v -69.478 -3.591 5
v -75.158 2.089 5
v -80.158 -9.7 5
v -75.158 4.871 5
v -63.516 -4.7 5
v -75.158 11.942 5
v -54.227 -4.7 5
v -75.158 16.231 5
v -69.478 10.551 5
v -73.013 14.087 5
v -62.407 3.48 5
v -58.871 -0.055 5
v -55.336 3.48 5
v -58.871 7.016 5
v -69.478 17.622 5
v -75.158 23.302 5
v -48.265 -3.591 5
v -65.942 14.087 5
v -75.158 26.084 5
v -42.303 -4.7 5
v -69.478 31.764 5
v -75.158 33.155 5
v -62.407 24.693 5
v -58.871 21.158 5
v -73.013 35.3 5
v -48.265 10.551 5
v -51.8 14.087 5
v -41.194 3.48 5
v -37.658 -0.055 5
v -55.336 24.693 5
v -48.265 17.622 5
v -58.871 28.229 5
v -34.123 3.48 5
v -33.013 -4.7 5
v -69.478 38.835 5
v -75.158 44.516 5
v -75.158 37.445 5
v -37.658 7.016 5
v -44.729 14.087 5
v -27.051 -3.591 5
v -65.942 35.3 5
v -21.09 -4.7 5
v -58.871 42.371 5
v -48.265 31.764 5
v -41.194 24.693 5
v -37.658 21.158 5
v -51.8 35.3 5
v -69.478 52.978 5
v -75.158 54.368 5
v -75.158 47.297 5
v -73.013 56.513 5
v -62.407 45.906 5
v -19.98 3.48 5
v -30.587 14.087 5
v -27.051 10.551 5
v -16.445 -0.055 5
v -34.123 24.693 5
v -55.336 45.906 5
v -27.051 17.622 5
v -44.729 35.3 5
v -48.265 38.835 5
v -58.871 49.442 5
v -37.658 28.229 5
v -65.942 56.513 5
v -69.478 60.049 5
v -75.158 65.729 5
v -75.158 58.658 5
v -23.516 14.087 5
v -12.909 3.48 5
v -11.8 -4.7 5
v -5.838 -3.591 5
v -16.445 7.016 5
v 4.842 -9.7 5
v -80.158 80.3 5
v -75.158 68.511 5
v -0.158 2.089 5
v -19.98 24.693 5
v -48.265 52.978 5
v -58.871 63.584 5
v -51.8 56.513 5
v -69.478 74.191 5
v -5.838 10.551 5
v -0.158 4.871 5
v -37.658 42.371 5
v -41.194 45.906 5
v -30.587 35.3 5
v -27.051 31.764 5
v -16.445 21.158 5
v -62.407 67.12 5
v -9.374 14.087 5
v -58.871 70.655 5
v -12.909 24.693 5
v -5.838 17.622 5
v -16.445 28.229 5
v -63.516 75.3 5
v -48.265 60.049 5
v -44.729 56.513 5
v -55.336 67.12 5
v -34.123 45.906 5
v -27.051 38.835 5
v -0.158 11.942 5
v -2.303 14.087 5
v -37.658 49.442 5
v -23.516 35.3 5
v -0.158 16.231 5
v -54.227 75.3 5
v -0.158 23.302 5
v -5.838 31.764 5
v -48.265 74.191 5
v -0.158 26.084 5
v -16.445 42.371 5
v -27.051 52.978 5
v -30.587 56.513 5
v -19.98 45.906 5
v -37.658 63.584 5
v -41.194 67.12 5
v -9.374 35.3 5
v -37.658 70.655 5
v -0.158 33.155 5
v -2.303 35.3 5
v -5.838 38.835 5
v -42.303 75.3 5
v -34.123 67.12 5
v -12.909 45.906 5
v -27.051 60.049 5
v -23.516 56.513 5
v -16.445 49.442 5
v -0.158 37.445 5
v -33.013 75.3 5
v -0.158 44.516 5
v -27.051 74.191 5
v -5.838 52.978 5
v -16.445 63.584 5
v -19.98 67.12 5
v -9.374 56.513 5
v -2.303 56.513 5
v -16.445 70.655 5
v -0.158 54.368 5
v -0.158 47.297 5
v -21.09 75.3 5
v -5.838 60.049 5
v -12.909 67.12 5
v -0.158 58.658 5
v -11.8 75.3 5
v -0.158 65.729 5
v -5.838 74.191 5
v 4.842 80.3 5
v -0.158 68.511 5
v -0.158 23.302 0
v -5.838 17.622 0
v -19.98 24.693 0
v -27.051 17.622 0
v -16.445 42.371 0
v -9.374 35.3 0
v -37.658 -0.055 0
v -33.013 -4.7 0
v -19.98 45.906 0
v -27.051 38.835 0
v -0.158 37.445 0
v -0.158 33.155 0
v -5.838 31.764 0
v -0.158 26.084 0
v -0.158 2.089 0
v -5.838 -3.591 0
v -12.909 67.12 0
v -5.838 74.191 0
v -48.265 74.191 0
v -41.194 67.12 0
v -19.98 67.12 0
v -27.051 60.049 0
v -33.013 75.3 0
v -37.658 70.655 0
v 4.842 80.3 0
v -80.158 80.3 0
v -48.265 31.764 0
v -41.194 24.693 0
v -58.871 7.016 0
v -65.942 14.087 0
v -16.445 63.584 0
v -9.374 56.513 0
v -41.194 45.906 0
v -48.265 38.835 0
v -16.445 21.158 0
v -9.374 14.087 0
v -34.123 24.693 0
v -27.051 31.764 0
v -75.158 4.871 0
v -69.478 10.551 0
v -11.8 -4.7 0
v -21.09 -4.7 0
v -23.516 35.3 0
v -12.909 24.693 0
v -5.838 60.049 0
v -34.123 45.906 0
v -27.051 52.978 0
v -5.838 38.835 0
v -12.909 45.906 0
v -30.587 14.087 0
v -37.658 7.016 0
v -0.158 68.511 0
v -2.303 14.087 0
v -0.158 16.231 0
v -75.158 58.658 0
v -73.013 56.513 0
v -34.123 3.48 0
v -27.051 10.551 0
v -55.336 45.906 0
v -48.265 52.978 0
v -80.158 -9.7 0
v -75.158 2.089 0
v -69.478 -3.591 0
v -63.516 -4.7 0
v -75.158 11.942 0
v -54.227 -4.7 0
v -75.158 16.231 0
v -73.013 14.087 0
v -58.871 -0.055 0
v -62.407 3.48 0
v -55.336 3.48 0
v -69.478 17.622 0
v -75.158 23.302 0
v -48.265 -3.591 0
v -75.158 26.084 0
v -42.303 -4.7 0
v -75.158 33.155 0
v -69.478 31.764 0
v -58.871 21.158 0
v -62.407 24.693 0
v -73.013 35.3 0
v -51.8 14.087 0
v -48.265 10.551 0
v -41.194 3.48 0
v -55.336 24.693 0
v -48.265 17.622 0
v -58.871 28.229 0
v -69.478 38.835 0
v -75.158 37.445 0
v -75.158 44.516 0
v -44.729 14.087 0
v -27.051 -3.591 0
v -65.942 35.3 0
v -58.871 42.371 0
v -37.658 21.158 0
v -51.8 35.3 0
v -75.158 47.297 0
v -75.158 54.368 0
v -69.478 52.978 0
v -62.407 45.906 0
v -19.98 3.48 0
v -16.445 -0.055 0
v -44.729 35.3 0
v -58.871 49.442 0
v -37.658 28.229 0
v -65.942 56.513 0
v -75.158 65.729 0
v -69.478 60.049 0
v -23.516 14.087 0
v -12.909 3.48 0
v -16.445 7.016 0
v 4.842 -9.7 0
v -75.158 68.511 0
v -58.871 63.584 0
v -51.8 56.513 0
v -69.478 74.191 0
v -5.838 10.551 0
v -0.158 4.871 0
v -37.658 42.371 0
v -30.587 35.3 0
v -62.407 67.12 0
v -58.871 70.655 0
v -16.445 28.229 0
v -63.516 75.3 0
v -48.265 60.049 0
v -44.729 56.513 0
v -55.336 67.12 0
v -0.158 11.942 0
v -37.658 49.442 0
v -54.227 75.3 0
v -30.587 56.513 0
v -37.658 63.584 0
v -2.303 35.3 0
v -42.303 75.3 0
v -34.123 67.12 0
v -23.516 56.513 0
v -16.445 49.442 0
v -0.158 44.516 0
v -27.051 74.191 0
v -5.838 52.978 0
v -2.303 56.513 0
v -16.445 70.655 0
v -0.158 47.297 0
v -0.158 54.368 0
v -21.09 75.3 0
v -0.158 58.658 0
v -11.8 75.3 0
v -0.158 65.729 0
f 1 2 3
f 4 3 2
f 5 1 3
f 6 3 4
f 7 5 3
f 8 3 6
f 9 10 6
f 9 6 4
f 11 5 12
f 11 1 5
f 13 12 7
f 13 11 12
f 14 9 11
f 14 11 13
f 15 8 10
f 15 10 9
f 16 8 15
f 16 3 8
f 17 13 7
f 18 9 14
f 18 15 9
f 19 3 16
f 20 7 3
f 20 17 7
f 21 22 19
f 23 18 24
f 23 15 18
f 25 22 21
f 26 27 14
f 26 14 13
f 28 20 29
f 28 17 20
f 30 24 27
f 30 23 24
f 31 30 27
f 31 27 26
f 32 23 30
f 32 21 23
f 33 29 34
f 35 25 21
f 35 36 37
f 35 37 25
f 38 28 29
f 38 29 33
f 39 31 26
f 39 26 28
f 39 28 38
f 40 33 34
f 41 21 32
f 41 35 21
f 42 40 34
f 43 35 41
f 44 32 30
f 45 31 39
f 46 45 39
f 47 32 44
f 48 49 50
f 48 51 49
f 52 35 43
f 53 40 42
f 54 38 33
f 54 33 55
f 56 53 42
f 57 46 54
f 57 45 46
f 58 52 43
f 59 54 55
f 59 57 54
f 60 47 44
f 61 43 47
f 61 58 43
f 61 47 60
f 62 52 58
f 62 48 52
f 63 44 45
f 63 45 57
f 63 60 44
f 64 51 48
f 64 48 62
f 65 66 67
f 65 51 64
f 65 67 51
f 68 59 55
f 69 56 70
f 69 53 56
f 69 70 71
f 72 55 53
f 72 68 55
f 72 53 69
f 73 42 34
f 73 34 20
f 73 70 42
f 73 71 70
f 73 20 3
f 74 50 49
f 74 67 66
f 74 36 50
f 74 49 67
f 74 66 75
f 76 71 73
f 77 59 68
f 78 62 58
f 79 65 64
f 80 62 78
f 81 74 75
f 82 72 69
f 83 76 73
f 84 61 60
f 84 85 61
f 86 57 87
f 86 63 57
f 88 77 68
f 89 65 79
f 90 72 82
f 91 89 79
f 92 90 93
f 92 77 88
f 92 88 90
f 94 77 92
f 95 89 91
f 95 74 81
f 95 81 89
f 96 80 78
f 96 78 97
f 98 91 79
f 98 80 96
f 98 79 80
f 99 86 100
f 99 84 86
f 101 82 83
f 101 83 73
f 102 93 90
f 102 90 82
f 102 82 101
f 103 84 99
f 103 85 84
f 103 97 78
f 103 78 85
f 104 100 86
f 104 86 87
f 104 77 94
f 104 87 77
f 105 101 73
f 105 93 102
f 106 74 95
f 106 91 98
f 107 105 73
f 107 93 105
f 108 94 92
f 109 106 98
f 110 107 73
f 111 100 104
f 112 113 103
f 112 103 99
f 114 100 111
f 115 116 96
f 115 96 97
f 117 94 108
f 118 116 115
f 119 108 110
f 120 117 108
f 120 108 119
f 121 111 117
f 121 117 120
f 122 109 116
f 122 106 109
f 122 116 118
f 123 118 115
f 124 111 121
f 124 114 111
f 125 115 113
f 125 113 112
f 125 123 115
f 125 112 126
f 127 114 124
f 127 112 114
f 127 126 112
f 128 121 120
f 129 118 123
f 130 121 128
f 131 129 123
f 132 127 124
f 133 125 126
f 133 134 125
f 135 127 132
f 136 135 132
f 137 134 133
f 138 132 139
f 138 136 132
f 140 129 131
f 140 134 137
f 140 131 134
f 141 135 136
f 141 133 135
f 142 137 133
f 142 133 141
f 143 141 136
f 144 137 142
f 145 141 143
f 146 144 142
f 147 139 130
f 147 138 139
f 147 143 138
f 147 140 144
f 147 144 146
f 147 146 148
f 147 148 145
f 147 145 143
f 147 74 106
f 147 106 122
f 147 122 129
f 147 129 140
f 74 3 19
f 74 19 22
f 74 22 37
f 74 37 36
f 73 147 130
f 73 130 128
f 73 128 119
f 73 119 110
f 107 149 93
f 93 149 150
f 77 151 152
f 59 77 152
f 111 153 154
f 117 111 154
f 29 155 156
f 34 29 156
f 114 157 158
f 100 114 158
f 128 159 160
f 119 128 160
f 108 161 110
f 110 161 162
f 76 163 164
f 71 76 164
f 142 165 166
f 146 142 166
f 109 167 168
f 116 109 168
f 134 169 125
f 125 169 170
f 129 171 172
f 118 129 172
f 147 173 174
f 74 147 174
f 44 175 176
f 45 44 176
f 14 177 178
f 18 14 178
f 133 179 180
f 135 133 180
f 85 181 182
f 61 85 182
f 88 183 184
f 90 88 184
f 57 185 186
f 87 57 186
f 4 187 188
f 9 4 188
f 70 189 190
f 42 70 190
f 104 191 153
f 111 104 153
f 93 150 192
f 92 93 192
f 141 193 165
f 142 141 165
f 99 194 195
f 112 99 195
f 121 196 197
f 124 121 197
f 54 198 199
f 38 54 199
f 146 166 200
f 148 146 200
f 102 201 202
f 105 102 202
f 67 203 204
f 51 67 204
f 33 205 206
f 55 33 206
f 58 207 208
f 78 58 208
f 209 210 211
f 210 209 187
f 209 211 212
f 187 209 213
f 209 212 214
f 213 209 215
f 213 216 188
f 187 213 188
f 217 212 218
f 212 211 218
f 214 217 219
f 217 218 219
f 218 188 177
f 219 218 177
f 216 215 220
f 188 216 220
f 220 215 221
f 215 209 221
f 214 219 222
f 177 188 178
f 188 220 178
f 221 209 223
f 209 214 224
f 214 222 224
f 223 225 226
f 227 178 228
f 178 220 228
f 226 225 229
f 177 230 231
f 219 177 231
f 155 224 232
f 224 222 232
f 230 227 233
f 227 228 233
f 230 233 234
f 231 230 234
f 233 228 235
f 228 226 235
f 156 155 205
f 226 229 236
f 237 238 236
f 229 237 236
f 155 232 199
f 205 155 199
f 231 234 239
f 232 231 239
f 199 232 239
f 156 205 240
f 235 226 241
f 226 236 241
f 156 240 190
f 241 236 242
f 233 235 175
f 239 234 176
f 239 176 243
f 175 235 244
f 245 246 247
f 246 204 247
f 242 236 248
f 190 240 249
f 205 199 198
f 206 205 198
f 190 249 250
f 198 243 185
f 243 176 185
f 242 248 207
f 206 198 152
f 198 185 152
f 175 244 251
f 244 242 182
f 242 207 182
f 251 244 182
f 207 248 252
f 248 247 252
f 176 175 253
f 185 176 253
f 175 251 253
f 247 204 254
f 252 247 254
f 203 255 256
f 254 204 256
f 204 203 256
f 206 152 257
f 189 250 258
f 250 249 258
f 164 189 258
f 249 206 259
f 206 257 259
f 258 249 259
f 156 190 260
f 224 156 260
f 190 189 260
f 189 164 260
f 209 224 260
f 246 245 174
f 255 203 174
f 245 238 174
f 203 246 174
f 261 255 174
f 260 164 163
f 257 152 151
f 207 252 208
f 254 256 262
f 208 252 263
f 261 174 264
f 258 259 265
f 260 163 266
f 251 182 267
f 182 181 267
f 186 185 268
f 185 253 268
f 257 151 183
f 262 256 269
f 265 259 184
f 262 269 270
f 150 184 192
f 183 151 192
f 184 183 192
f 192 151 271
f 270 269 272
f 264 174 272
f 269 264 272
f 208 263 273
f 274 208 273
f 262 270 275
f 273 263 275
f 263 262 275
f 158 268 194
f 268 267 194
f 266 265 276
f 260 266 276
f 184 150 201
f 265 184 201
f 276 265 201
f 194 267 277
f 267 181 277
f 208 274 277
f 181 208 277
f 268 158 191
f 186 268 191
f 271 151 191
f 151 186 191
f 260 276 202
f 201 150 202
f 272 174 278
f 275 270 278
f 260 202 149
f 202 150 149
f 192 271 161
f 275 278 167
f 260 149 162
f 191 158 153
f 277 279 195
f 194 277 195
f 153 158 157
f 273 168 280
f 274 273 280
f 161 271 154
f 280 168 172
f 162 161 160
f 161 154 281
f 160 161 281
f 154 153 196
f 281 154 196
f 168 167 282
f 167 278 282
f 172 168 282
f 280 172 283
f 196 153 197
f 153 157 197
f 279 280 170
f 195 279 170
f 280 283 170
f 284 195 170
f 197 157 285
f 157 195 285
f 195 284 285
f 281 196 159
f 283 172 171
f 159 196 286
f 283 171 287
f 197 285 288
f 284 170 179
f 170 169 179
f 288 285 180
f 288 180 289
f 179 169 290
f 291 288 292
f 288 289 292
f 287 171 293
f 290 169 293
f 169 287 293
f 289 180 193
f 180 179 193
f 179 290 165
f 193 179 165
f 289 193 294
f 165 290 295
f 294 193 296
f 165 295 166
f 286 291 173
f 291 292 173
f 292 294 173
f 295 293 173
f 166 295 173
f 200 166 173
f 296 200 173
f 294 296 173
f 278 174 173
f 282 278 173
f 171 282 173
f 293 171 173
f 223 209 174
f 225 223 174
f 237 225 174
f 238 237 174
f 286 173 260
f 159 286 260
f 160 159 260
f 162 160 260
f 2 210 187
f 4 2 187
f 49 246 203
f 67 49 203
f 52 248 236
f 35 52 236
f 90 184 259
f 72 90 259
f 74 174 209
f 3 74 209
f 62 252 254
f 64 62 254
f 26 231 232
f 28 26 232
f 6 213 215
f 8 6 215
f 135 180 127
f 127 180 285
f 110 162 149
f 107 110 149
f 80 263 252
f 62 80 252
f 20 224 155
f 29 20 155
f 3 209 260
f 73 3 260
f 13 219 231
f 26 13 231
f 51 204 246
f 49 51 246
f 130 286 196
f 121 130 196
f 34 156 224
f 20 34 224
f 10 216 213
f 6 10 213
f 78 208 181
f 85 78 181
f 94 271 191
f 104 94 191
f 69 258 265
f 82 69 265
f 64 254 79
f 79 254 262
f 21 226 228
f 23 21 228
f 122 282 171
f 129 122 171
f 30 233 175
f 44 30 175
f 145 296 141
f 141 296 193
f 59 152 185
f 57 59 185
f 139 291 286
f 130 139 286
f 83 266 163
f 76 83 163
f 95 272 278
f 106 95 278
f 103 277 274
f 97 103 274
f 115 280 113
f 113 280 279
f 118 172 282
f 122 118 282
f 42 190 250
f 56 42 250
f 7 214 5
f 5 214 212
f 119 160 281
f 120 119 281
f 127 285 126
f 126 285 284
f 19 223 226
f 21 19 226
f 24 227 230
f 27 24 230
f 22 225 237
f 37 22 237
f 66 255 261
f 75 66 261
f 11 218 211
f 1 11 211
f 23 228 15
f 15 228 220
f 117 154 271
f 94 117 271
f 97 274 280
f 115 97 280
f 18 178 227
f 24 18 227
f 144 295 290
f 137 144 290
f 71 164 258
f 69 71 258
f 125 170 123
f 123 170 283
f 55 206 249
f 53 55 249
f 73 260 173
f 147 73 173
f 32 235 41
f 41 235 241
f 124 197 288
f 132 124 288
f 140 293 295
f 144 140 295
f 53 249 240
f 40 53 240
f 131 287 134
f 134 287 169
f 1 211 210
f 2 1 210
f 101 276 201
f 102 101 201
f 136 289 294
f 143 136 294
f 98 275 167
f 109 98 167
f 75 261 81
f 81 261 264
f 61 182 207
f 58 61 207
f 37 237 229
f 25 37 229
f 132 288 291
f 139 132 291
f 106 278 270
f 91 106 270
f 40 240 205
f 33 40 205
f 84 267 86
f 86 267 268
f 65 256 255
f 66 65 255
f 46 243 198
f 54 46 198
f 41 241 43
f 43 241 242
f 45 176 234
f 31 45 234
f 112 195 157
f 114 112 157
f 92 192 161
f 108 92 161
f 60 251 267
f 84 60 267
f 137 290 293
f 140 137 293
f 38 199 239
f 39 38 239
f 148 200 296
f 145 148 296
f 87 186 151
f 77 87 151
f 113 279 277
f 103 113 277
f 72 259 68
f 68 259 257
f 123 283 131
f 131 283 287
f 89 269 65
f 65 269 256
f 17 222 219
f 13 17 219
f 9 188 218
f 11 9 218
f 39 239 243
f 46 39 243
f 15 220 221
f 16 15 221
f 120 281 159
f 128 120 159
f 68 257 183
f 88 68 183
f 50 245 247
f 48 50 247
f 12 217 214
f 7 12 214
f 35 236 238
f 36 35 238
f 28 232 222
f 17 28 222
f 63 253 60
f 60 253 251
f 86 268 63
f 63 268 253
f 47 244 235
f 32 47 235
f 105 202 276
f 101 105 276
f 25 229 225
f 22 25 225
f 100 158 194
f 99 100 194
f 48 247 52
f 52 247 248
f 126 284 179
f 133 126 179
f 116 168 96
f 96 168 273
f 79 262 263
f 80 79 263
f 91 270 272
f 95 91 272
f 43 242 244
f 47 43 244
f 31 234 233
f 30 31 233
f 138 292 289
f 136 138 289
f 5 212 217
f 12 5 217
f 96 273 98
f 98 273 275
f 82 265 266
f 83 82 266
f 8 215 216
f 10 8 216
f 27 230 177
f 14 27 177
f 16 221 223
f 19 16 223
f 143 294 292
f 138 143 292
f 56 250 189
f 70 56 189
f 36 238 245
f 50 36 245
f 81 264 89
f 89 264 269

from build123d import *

# Parameters (mm, degrees)
SALIENTE_EXTRUIR1_DEPTH = 5


with BuildPart() as part:
    # Croquis1 → Saliente-Extruir1 (new body)
    with BuildSketch(Plane.XY):
        Polygon((4.84193268, 80.299895435), (-80.15806732, 80.299895435), (-80.15806732, 42.297370118), (-80.15806732, 28.302420752), (-80.15806732, 21.084166683), (-80.15806732, 7.089217316), (-80.15806732, -9.700104565), (-63.368745439, -9.700104565), (-54.373796072, -9.700104565), (-42.155542003, -9.700104565), (-33.160592637, -9.700104565), (-20.942338567, -9.700104565), (-11.947389201, -9.700104565), (4.84193268, -9.700104565), (4.84193268, 7.089217316), (4.84193268, 21.084166683), (4.84193268, 28.302420752), (4.84193268, 42.297370118), align=None)
        Polygon((-69.477872473, 10.551158094), (-62.406804661, 3.480090282), (-69.477872473, -3.59097753), (-75.15806732, 2.089217316), (-75.15806732, 4.870963247), align=None, mode=Mode.SUBTRACT)
        Polygon((-58.871270756, -0.055443624), (-54.226609815, -4.700104565), (-63.515931696, -4.700104565), align=None, mode=Mode.SUBTRACT)
        Polygon((-75.15806732, 16.23135294), (-73.013406379, 14.086692), (-75.15806732, 11.942031059), align=None, mode=Mode.SUBTRACT)
        Polygon((-58.871270756, 21.157759811), (-51.800202944, 14.086692), (-58.871270756, 7.015624188), (-65.942338567, 14.086692), align=None, mode=Mode.SUBTRACT)
        Polygon((-48.264669038, 10.551158094), (-41.193601226, 3.480090282), (-48.264669038, -3.59097753), (-55.33573685, 3.480090282), align=None, mode=Mode.SUBTRACT)
        Polygon((-37.65806732, -0.055443624), (-33.013406379, -4.700104565), (-42.302728261, -4.700104565), align=None, mode=Mode.SUBTRACT)
        Polygon((-37.65806732, 21.157759811), (-30.586999508, 14.086692), (-37.65806732, 7.015624188), (-44.729135132, 14.086692), align=None, mode=Mode.SUBTRACT)
        Polygon((-69.477872473, 31.764361529), (-62.406804661, 24.693293717), (-69.477872473, 17.622225905), (-75.15806732, 23.302420752), (-75.15806732, 26.084166683), align=None, mode=Mode.SUBTRACT)
        Polygon((-58.871270756, 28.228827623), (-65.942338567, 35.299895435), (-58.871270756, 42.370963247), (-51.800202944, 35.299895435), align=None, mode=Mode.SUBTRACT)
        Polygon((-48.264669038, 31.764361529), (-41.193601226, 24.693293717), (-48.264669038, 17.622225905), (-55.33573685, 24.693293717), align=None, mode=Mode.SUBTRACT)
        Polygon((-27.051465602, 10.551158094), (-19.98039779, 3.480090282), (-27.051465602, -3.59097753), (-34.122533414, 3.480090282), align=None, mode=Mode.SUBTRACT)
        Polygon((-16.444863884, -0.055443624), (-11.800202944, -4.700104565), (-21.089524825, -4.700104565), align=None, mode=Mode.SUBTRACT)
        Polygon((-5.838262167, 10.551158094), (-0.15806732, 4.870963247), (-0.15806732, 2.089217316), (-5.838262167, -3.59097753), (-12.909329978, 3.480090282), align=None, mode=Mode.SUBTRACT)
        Polygon((-16.444863884, 21.157759811), (-9.373796072, 14.086692), (-16.444863884, 7.015624188), (-23.515931696, 14.086692), align=None, mode=Mode.SUBTRACT)
        Polygon((-2.302728261, 14.086692), (-0.15806732, 16.23135294), (-0.15806732, 11.942031059), align=None, mode=Mode.SUBTRACT)
        Polygon((-27.051465602, 31.764361529), (-19.98039779, 24.693293717), (-27.051465602, 17.622225905), (-34.122533414, 24.693293717), align=None, mode=Mode.SUBTRACT)
        Polygon((-5.838262167, 31.764361529), (-0.15806732, 26.084166683), (-0.15806732, 23.302420752), (-5.838262167, 17.622225905), (-12.909329978, 24.693293717), align=None, mode=Mode.SUBTRACT)
        Polygon((-73.013406379, 35.299895435), (-75.15806732, 33.155234494), (-75.15806732, 37.444556376), align=None, mode=Mode.SUBTRACT)
        Polygon((-62.406804661, 45.906497153), (-69.477872473, 38.835429341), (-75.15806732, 44.515624188), (-75.15806732, 47.297370118), (-69.477872473, 52.977564965), align=None, mode=Mode.SUBTRACT)
        Polygon((-44.729135132, 35.299895435), (-37.65806732, 42.370963247), (-30.586999508, 35.299895435), (-37.65806732, 28.228827623), align=None, mode=Mode.SUBTRACT)
        Polygon((-55.33573685, 45.906497153), (-48.264669038, 52.977564965), (-41.193601226, 45.906497153), (-48.264669038, 38.835429341), align=None, mode=Mode.SUBTRACT)
        Polygon((-75.15806732, 58.657759811), (-73.013406379, 56.513098871), (-75.15806732, 54.36843793), align=None, mode=Mode.SUBTRACT)
        Polygon((-65.942338567, 56.513098871), (-58.871270756, 63.584166683), (-51.800202944, 56.513098871), (-58.871270756, 49.442031059), align=None, mode=Mode.SUBTRACT)
        Polygon((-62.406804661, 67.119700589), (-69.477872473, 60.048632777), (-75.15806732, 65.728827623), (-75.15806732, 68.510573554), (-69.477872473, 74.1907684), align=None, mode=Mode.SUBTRACT)
        Polygon((-54.226609815, 75.299895435), (-58.871270756, 70.655234494), (-63.515931696, 75.299895435), align=None, mode=Mode.SUBTRACT)
        Polygon((-44.729135132, 56.513098871), (-37.65806732, 63.584166683), (-30.586999508, 56.513098871), (-37.65806732, 49.442031059), align=None, mode=Mode.SUBTRACT)
        Polygon((-55.33573685, 67.119700589), (-48.264669038, 74.1907684), (-41.193601226, 67.119700589), (-48.264669038, 60.048632777), align=None, mode=Mode.SUBTRACT)
        Polygon((-33.013406379, 75.299895435), (-37.65806732, 70.655234494), (-42.302728261, 75.299895435), align=None, mode=Mode.SUBTRACT)
        Polygon((-34.122533414, 45.906497153), (-27.051465602, 52.977564965), (-19.98039779, 45.906497153), (-27.051465602, 38.835429341), align=None, mode=Mode.SUBTRACT)
        Polygon((-16.444863884, 28.228827623), (-23.515931696, 35.299895435), (-16.444863884, 42.370963247), (-9.373796072, 35.299895435), align=None, mode=Mode.SUBTRACT)
        Polygon((-0.15806732, 33.155234494), (-2.302728261, 35.299895435), (-0.15806732, 37.444556376), align=None, mode=Mode.SUBTRACT)
        Polygon((-0.15806732, 44.515624188), (-5.838262167, 38.835429341), (-12.909329978, 45.906497153), (-5.838262167, 52.977564965), (-0.15806732, 47.297370118), align=None, mode=Mode.SUBTRACT)
        Polygon((-34.122533414, 67.119700589), (-27.051465602, 74.1907684), (-19.98039779, 67.119700589), (-27.051465602, 60.048632777), align=None, mode=Mode.SUBTRACT)
        Polygon((-23.515931696, 56.513098871), (-16.444863884, 63.584166683), (-9.373796072, 56.513098871), (-16.444863884, 49.442031059), align=None, mode=Mode.SUBTRACT)
        Polygon((-0.15806732, 54.36843793), (-2.302728261, 56.513098871), (-0.15806732, 58.657759811), align=None, mode=Mode.SUBTRACT)
        Polygon((-11.800202944, 75.299895435), (-16.444863884, 70.655234494), (-21.089524825, 75.299895435), align=None, mode=Mode.SUBTRACT)
        Polygon((-0.15806732, 68.510573554), (-0.15806732, 65.728827623), (-5.838262167, 60.048632777), (-12.909329978, 67.119700589), (-5.838262167, 74.1907684), align=None, mode=Mode.SUBTRACT)
    extrude(amount=SALIENTE_EXTRUIR1_DEPTH)


solid = part.part
